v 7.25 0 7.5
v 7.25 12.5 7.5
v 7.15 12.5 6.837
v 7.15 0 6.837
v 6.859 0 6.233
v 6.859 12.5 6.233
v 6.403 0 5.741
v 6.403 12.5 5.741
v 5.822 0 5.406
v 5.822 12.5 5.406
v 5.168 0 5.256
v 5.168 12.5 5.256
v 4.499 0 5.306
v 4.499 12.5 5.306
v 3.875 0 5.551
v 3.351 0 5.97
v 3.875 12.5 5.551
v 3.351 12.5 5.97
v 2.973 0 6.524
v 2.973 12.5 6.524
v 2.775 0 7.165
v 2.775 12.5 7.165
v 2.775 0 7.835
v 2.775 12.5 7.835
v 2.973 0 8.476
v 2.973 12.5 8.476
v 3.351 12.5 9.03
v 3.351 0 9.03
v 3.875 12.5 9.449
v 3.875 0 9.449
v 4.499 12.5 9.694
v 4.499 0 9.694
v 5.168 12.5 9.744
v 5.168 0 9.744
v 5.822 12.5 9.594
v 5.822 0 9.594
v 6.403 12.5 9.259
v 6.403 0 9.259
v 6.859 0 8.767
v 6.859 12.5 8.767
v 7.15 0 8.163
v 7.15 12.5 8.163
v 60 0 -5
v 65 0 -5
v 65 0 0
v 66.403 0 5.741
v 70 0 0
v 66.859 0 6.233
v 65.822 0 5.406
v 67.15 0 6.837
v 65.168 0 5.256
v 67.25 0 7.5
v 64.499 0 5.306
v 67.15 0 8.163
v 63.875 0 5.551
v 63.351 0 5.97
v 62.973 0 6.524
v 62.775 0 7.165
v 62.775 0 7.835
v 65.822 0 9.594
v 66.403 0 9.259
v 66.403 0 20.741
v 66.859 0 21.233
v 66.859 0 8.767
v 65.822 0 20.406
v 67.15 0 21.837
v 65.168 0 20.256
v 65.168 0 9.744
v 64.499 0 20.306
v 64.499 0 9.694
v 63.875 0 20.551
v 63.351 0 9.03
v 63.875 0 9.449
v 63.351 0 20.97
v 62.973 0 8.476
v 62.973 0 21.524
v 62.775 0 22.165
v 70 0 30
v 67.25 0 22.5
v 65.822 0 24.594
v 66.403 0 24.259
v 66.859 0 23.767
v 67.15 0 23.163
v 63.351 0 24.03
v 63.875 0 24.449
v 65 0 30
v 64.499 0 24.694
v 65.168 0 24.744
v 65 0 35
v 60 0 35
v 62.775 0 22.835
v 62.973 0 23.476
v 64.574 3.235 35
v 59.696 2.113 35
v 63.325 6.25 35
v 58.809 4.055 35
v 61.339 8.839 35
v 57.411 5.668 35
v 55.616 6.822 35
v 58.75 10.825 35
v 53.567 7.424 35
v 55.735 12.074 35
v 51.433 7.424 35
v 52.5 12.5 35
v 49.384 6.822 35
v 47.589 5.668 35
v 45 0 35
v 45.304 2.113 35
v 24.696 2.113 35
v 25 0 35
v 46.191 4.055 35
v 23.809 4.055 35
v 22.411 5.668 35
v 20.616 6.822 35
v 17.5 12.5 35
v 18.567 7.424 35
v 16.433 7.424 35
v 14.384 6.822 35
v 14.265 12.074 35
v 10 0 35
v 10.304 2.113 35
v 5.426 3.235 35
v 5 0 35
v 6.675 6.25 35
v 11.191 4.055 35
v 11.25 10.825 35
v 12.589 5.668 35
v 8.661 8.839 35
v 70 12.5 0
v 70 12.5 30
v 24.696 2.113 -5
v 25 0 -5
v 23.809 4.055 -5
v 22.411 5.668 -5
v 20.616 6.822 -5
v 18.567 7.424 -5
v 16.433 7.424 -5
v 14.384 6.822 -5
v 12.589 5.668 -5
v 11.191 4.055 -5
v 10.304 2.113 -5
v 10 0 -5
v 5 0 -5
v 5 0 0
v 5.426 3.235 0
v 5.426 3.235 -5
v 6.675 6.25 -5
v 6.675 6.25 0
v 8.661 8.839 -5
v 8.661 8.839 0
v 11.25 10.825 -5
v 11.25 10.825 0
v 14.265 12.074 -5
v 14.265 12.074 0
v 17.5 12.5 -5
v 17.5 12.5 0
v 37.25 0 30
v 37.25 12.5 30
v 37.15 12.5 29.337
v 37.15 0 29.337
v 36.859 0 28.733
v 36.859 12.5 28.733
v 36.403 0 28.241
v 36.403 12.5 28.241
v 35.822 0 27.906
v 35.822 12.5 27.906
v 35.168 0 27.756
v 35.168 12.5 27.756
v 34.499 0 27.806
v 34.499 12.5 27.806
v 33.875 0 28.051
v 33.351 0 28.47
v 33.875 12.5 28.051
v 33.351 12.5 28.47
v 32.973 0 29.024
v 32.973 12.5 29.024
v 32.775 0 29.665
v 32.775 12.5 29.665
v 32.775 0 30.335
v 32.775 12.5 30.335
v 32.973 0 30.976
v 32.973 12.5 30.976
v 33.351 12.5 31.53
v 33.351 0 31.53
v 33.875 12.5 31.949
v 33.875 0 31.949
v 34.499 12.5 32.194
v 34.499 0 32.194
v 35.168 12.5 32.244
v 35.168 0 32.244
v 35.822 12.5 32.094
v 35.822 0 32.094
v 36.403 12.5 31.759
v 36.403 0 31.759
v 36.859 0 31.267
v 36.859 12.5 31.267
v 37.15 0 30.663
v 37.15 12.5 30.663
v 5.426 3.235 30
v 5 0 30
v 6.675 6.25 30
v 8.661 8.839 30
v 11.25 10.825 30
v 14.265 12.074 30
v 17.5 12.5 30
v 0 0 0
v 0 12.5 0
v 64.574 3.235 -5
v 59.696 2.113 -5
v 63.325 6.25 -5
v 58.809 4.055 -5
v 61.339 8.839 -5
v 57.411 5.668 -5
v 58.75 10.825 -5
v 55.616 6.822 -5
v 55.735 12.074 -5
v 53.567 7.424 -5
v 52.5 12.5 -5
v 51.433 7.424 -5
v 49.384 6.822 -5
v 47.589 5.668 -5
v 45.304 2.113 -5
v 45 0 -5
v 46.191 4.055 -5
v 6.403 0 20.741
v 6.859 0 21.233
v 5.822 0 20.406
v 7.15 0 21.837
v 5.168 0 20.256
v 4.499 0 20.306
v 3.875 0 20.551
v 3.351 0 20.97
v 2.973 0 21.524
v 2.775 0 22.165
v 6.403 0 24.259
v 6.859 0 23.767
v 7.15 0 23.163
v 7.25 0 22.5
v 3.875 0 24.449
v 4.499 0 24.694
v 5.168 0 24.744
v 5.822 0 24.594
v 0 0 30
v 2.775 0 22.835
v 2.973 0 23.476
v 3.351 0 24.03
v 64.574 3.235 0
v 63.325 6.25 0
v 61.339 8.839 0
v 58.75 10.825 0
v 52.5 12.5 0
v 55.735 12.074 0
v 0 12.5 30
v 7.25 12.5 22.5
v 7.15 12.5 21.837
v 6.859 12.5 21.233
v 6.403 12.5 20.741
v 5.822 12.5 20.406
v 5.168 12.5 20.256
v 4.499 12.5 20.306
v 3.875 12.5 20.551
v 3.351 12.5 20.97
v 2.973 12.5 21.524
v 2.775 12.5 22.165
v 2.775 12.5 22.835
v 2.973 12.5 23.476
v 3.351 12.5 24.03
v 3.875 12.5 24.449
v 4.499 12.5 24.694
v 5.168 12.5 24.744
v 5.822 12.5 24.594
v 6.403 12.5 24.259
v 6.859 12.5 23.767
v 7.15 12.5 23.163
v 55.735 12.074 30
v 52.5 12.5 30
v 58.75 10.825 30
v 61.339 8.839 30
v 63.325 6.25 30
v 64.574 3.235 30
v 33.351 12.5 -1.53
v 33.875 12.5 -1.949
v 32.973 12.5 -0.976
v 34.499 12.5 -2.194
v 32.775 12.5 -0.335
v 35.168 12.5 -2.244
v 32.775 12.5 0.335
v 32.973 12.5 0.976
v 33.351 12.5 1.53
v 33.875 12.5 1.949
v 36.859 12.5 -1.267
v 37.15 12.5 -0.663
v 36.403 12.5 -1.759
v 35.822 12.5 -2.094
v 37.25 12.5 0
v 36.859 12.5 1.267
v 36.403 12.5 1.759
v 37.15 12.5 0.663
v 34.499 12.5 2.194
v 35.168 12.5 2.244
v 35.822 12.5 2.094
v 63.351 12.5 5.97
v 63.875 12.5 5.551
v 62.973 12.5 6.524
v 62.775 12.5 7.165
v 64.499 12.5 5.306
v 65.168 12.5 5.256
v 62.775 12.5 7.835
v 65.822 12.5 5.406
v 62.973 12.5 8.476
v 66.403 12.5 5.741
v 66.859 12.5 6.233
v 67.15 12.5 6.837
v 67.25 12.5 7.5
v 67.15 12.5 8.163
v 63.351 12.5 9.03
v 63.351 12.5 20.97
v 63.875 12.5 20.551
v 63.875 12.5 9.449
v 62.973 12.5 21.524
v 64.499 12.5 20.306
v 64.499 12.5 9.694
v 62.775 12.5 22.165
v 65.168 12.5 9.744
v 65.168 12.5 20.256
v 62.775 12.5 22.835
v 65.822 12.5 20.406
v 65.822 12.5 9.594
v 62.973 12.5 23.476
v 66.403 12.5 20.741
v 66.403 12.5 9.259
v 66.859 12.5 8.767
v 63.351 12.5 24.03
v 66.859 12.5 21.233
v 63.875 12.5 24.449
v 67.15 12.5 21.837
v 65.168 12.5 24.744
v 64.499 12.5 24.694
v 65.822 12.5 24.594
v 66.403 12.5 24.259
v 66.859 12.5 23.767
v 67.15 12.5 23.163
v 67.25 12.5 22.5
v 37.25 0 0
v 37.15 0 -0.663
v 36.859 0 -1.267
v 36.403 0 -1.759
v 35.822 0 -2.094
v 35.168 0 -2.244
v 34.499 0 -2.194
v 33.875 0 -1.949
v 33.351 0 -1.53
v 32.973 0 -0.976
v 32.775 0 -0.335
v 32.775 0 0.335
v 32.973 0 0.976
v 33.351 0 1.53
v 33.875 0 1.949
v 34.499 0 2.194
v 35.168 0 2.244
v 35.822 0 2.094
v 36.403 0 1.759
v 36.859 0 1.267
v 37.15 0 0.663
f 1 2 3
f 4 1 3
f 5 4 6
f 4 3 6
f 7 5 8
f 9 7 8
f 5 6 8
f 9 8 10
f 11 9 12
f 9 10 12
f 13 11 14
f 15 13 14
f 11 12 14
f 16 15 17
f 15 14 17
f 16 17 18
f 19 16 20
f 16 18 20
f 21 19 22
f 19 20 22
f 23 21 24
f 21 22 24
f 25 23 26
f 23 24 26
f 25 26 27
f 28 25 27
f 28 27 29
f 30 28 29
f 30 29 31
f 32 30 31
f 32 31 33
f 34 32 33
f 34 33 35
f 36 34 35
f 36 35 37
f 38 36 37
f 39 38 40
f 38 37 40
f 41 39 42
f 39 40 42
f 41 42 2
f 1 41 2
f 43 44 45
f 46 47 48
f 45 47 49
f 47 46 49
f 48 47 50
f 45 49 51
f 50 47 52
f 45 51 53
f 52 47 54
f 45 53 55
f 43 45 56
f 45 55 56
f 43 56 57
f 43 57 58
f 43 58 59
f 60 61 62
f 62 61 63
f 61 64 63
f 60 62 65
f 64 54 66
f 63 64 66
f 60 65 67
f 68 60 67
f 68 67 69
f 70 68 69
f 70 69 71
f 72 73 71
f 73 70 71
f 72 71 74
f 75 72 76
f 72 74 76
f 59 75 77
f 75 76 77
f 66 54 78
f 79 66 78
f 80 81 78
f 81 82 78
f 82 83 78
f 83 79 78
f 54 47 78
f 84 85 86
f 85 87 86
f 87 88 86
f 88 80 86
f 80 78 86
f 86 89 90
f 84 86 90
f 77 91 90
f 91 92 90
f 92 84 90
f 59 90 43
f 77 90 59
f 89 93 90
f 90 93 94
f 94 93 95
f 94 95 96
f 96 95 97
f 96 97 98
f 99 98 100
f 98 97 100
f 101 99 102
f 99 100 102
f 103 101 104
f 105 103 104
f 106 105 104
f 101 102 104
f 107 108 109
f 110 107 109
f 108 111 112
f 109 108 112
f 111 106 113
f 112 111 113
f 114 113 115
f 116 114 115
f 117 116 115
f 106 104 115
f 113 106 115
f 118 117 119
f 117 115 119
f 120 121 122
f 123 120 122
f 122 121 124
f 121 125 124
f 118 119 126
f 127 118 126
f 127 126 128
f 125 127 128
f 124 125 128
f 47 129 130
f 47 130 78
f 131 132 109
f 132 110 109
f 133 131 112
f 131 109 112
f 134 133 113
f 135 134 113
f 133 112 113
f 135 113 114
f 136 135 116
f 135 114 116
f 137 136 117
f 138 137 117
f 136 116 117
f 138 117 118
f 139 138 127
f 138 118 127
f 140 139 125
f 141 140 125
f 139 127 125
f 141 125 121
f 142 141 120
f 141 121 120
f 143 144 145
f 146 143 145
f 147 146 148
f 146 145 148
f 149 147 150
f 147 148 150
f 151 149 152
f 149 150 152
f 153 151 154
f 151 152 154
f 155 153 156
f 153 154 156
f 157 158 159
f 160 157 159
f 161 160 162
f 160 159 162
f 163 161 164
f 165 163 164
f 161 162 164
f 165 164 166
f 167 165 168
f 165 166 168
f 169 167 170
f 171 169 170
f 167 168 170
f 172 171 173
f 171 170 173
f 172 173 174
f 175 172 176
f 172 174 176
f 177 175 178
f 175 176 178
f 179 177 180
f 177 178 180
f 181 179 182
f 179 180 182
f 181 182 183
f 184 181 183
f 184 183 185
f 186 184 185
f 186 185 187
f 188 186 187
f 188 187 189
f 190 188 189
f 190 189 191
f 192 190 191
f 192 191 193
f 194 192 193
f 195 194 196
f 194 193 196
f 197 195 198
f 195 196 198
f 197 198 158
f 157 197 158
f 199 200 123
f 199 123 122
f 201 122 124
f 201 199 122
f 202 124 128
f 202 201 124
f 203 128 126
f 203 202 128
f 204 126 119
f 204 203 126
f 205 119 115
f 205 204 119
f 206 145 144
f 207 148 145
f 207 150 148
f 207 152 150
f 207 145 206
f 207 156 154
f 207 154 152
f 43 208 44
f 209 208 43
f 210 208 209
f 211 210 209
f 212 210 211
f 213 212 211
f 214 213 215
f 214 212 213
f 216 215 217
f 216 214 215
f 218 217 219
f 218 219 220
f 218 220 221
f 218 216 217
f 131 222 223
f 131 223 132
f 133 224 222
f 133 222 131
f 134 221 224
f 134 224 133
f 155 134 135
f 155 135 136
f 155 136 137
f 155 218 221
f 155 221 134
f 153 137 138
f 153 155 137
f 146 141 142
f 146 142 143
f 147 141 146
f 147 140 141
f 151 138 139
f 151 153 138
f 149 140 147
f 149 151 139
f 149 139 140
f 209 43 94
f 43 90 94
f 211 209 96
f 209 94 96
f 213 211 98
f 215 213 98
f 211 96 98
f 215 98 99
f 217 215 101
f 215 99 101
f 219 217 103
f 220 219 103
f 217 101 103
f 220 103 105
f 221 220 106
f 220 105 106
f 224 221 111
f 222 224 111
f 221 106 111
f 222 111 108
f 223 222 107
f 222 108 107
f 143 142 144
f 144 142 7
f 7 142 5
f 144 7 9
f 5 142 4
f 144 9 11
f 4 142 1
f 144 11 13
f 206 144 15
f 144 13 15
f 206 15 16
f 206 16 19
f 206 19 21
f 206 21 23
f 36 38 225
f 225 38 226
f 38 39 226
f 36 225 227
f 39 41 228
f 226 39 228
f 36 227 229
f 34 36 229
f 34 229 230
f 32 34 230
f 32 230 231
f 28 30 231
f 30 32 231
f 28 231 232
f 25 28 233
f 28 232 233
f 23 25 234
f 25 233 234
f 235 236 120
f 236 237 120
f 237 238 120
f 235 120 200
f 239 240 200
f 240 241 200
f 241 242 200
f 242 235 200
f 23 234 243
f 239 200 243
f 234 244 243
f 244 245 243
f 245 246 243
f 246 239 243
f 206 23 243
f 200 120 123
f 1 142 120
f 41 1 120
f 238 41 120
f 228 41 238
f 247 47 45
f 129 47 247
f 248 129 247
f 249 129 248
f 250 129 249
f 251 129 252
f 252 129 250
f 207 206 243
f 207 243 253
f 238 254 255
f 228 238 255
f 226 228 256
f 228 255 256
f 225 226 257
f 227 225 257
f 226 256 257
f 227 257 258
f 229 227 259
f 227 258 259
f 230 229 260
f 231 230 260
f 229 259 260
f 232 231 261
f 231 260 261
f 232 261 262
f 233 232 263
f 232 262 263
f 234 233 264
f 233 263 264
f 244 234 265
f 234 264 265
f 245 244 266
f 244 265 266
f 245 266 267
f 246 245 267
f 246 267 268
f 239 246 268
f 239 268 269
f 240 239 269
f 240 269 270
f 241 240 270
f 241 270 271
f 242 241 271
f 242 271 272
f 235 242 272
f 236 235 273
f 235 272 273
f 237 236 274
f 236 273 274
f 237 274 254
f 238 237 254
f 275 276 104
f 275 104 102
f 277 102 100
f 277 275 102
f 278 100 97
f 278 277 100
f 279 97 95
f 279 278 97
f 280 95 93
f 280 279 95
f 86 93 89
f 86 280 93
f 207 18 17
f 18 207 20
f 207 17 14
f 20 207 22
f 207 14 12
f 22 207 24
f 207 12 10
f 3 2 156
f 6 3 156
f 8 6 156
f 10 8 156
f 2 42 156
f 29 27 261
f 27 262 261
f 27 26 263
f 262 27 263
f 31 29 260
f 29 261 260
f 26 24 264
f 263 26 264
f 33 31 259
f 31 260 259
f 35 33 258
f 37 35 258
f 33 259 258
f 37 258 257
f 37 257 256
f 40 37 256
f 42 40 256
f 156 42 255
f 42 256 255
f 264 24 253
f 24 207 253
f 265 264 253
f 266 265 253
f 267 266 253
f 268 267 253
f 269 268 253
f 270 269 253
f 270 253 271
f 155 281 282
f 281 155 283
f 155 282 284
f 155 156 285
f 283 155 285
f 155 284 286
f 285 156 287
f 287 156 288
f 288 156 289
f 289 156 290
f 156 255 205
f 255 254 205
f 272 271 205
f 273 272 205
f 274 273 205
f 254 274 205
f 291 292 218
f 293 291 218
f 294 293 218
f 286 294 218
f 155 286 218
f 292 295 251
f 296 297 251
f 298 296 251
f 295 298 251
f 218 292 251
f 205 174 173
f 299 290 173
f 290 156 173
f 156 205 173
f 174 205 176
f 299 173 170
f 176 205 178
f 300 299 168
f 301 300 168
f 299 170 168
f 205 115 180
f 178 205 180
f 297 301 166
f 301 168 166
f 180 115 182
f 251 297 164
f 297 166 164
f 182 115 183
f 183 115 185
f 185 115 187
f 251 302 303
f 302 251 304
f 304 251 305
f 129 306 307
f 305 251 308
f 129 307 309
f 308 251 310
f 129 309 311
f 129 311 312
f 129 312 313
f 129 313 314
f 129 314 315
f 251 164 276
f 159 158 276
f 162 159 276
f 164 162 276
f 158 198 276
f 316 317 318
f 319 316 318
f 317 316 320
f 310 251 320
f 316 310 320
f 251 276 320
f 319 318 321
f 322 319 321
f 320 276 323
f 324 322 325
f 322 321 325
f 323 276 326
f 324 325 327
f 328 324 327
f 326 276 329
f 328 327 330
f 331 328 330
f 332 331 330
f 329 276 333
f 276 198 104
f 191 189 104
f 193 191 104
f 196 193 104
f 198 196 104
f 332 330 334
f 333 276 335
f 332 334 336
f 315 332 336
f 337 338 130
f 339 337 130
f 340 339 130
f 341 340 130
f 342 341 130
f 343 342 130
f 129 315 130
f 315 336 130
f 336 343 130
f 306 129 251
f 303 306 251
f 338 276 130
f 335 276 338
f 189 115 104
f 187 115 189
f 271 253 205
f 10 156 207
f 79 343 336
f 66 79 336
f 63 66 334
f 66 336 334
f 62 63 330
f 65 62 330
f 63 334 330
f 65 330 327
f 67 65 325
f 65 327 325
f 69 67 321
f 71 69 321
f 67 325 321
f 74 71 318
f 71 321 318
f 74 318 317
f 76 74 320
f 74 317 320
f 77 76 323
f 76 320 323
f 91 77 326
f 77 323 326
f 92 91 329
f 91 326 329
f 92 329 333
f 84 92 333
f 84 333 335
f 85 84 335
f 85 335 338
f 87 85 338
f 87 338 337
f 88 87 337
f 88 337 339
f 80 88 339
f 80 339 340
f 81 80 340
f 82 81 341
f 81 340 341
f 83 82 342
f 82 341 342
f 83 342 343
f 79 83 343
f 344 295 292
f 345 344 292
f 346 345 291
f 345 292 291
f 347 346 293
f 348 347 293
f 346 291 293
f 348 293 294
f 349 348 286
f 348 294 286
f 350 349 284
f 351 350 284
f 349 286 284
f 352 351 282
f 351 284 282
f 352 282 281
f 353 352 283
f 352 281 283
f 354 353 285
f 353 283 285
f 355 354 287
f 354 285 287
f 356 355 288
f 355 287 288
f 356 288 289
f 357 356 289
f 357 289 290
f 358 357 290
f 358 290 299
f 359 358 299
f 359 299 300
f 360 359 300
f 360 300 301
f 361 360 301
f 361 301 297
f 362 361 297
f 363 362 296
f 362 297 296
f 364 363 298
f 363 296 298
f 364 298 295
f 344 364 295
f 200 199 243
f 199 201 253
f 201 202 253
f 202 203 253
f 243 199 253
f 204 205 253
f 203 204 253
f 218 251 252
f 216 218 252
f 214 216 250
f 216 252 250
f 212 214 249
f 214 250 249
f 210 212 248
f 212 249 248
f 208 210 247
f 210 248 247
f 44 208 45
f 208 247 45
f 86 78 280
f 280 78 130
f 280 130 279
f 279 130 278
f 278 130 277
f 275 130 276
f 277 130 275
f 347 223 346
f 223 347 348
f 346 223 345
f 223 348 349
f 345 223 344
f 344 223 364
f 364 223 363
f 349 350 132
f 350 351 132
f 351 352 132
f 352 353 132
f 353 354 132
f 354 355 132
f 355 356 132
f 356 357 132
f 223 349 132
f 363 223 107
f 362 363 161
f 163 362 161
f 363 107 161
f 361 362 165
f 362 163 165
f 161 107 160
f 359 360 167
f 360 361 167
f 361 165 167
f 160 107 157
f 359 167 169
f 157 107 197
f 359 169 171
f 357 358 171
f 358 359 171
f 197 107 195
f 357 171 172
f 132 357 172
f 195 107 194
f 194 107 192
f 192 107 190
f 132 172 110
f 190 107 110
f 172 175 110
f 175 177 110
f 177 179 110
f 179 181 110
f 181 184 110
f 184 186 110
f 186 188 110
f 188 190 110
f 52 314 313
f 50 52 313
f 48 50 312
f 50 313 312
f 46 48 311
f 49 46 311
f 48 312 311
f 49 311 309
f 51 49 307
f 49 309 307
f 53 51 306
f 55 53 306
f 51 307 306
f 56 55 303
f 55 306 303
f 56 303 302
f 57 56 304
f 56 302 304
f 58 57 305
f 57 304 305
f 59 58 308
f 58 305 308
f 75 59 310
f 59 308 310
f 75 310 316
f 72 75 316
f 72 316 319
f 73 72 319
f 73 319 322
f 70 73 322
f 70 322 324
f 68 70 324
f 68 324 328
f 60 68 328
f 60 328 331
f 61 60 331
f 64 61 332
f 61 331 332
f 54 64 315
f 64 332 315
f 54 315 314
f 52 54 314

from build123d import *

# Parameters (mm, degrees)
BOSS_EXTRUDE1_DEPTH = 30
BOSS_EXTRUDE2_DEPTH = 5
BOSS_EXTRUDE3_DEPTH = 5
SKETCH5_R           = 2.25
CUT_EXTRUDE1_DEPTH  = 12.5


with BuildPart() as part:
    # Sketch2 → Boss-Extrude1 (new body)
    with BuildSketch(Plane.XY):
        with BuildLine():
            Line((0, 0), (0, 12.5))
            Line((0, 12.5), (70, 12.5))
            Line((70, 12.5), (70, 0))
            Line((70, 0), (60, 0))
            ThreePointArc((60, 0), (52.5, 7.5), (45, 0))
            Line((45, 0), (25, 0))
            ThreePointArc((25, 0), (17.5, 7.5), (10, 0))
            Line((10, 0), (0, 0))
        make_face()
    extrude(amount=BOSS_EXTRUDE1_DEPTH)

    # Sketch3 → Boss-Extrude2 (add)
    with BuildSketch(Plane.XY.offset(30)):
        with BuildLine():
            Line((17.5, 12.5), (52.5, 12.5))
            ThreePointArc((52.5, 12.5), (61.338834765, 8.838834765), (65, 0))
            Line((65, 0), (60, 0))
            ThreePointArc((60, 0), (52.5, 7.5), (45, 0))
            Line((45, 0), (25, 0))
            ThreePointArc((25, 0), (17.5, 7.5), (10, 0))
            Line((10, 0), (5, 0))
            ThreePointArc((5, 0), (8.661165235, 8.838834765), (17.5, 12.5))
        make_face()
    extrude(amount=BOSS_EXTRUDE2_DEPTH)

    # Sketch4 → Boss-Extrude3 (add)
    with BuildSketch(Plane(origin=(0, 0, 0), x_dir=(-1, 0, 0), z_dir=(0, 0, -1))):
        with BuildLine():
            Line((-65, 0), (-60, 0))
            ThreePointArc((-60, 0), (-52.5, 7.5), (-45, 0))
            Line((-45, 0), (-25, 0))
            ThreePointArc((-25, 0), (-17.5, 7.5), (-10, 0))
            Line((-10, 0), (-5, 0))
            ThreePointArc((-5, 0), (-8.661165235, 8.838834765), (-17.5, 12.5))
            Line((-17.5, 12.5), (-52.5, 12.5))
            ThreePointArc((-52.5, 12.5), (-61.338834765, 8.838834765), (-65, 0))
        make_face()
    extrude(amount=BOSS_EXTRUDE3_DEPTH)

    # Sketch5 → Cut-Extrude1 (cut)
    with BuildSketch(Plane(origin=(0, 12.5, 0), x_dir=(1, 0, 0), z_dir=(0, 1, 0))):
        with Locations((35, 0)):
            Circle(SKETCH5_R)
        with Locations((35, -30)):
            Circle(SKETCH5_R)
        with Locations((65, -7.5)):
            Circle(SKETCH5_R)
        with Locations((65, -22.5)):
            Circle(SKETCH5_R)
        with Locations((5, -22.5)):
            Circle(SKETCH5_R)
        with Locations((5, -7.5)):
            Circle(SKETCH5_R)
    extrude(amount=-CUT_EXTRUDE1_DEPTH, mode=Mode.SUBTRACT)


solid = part.part
